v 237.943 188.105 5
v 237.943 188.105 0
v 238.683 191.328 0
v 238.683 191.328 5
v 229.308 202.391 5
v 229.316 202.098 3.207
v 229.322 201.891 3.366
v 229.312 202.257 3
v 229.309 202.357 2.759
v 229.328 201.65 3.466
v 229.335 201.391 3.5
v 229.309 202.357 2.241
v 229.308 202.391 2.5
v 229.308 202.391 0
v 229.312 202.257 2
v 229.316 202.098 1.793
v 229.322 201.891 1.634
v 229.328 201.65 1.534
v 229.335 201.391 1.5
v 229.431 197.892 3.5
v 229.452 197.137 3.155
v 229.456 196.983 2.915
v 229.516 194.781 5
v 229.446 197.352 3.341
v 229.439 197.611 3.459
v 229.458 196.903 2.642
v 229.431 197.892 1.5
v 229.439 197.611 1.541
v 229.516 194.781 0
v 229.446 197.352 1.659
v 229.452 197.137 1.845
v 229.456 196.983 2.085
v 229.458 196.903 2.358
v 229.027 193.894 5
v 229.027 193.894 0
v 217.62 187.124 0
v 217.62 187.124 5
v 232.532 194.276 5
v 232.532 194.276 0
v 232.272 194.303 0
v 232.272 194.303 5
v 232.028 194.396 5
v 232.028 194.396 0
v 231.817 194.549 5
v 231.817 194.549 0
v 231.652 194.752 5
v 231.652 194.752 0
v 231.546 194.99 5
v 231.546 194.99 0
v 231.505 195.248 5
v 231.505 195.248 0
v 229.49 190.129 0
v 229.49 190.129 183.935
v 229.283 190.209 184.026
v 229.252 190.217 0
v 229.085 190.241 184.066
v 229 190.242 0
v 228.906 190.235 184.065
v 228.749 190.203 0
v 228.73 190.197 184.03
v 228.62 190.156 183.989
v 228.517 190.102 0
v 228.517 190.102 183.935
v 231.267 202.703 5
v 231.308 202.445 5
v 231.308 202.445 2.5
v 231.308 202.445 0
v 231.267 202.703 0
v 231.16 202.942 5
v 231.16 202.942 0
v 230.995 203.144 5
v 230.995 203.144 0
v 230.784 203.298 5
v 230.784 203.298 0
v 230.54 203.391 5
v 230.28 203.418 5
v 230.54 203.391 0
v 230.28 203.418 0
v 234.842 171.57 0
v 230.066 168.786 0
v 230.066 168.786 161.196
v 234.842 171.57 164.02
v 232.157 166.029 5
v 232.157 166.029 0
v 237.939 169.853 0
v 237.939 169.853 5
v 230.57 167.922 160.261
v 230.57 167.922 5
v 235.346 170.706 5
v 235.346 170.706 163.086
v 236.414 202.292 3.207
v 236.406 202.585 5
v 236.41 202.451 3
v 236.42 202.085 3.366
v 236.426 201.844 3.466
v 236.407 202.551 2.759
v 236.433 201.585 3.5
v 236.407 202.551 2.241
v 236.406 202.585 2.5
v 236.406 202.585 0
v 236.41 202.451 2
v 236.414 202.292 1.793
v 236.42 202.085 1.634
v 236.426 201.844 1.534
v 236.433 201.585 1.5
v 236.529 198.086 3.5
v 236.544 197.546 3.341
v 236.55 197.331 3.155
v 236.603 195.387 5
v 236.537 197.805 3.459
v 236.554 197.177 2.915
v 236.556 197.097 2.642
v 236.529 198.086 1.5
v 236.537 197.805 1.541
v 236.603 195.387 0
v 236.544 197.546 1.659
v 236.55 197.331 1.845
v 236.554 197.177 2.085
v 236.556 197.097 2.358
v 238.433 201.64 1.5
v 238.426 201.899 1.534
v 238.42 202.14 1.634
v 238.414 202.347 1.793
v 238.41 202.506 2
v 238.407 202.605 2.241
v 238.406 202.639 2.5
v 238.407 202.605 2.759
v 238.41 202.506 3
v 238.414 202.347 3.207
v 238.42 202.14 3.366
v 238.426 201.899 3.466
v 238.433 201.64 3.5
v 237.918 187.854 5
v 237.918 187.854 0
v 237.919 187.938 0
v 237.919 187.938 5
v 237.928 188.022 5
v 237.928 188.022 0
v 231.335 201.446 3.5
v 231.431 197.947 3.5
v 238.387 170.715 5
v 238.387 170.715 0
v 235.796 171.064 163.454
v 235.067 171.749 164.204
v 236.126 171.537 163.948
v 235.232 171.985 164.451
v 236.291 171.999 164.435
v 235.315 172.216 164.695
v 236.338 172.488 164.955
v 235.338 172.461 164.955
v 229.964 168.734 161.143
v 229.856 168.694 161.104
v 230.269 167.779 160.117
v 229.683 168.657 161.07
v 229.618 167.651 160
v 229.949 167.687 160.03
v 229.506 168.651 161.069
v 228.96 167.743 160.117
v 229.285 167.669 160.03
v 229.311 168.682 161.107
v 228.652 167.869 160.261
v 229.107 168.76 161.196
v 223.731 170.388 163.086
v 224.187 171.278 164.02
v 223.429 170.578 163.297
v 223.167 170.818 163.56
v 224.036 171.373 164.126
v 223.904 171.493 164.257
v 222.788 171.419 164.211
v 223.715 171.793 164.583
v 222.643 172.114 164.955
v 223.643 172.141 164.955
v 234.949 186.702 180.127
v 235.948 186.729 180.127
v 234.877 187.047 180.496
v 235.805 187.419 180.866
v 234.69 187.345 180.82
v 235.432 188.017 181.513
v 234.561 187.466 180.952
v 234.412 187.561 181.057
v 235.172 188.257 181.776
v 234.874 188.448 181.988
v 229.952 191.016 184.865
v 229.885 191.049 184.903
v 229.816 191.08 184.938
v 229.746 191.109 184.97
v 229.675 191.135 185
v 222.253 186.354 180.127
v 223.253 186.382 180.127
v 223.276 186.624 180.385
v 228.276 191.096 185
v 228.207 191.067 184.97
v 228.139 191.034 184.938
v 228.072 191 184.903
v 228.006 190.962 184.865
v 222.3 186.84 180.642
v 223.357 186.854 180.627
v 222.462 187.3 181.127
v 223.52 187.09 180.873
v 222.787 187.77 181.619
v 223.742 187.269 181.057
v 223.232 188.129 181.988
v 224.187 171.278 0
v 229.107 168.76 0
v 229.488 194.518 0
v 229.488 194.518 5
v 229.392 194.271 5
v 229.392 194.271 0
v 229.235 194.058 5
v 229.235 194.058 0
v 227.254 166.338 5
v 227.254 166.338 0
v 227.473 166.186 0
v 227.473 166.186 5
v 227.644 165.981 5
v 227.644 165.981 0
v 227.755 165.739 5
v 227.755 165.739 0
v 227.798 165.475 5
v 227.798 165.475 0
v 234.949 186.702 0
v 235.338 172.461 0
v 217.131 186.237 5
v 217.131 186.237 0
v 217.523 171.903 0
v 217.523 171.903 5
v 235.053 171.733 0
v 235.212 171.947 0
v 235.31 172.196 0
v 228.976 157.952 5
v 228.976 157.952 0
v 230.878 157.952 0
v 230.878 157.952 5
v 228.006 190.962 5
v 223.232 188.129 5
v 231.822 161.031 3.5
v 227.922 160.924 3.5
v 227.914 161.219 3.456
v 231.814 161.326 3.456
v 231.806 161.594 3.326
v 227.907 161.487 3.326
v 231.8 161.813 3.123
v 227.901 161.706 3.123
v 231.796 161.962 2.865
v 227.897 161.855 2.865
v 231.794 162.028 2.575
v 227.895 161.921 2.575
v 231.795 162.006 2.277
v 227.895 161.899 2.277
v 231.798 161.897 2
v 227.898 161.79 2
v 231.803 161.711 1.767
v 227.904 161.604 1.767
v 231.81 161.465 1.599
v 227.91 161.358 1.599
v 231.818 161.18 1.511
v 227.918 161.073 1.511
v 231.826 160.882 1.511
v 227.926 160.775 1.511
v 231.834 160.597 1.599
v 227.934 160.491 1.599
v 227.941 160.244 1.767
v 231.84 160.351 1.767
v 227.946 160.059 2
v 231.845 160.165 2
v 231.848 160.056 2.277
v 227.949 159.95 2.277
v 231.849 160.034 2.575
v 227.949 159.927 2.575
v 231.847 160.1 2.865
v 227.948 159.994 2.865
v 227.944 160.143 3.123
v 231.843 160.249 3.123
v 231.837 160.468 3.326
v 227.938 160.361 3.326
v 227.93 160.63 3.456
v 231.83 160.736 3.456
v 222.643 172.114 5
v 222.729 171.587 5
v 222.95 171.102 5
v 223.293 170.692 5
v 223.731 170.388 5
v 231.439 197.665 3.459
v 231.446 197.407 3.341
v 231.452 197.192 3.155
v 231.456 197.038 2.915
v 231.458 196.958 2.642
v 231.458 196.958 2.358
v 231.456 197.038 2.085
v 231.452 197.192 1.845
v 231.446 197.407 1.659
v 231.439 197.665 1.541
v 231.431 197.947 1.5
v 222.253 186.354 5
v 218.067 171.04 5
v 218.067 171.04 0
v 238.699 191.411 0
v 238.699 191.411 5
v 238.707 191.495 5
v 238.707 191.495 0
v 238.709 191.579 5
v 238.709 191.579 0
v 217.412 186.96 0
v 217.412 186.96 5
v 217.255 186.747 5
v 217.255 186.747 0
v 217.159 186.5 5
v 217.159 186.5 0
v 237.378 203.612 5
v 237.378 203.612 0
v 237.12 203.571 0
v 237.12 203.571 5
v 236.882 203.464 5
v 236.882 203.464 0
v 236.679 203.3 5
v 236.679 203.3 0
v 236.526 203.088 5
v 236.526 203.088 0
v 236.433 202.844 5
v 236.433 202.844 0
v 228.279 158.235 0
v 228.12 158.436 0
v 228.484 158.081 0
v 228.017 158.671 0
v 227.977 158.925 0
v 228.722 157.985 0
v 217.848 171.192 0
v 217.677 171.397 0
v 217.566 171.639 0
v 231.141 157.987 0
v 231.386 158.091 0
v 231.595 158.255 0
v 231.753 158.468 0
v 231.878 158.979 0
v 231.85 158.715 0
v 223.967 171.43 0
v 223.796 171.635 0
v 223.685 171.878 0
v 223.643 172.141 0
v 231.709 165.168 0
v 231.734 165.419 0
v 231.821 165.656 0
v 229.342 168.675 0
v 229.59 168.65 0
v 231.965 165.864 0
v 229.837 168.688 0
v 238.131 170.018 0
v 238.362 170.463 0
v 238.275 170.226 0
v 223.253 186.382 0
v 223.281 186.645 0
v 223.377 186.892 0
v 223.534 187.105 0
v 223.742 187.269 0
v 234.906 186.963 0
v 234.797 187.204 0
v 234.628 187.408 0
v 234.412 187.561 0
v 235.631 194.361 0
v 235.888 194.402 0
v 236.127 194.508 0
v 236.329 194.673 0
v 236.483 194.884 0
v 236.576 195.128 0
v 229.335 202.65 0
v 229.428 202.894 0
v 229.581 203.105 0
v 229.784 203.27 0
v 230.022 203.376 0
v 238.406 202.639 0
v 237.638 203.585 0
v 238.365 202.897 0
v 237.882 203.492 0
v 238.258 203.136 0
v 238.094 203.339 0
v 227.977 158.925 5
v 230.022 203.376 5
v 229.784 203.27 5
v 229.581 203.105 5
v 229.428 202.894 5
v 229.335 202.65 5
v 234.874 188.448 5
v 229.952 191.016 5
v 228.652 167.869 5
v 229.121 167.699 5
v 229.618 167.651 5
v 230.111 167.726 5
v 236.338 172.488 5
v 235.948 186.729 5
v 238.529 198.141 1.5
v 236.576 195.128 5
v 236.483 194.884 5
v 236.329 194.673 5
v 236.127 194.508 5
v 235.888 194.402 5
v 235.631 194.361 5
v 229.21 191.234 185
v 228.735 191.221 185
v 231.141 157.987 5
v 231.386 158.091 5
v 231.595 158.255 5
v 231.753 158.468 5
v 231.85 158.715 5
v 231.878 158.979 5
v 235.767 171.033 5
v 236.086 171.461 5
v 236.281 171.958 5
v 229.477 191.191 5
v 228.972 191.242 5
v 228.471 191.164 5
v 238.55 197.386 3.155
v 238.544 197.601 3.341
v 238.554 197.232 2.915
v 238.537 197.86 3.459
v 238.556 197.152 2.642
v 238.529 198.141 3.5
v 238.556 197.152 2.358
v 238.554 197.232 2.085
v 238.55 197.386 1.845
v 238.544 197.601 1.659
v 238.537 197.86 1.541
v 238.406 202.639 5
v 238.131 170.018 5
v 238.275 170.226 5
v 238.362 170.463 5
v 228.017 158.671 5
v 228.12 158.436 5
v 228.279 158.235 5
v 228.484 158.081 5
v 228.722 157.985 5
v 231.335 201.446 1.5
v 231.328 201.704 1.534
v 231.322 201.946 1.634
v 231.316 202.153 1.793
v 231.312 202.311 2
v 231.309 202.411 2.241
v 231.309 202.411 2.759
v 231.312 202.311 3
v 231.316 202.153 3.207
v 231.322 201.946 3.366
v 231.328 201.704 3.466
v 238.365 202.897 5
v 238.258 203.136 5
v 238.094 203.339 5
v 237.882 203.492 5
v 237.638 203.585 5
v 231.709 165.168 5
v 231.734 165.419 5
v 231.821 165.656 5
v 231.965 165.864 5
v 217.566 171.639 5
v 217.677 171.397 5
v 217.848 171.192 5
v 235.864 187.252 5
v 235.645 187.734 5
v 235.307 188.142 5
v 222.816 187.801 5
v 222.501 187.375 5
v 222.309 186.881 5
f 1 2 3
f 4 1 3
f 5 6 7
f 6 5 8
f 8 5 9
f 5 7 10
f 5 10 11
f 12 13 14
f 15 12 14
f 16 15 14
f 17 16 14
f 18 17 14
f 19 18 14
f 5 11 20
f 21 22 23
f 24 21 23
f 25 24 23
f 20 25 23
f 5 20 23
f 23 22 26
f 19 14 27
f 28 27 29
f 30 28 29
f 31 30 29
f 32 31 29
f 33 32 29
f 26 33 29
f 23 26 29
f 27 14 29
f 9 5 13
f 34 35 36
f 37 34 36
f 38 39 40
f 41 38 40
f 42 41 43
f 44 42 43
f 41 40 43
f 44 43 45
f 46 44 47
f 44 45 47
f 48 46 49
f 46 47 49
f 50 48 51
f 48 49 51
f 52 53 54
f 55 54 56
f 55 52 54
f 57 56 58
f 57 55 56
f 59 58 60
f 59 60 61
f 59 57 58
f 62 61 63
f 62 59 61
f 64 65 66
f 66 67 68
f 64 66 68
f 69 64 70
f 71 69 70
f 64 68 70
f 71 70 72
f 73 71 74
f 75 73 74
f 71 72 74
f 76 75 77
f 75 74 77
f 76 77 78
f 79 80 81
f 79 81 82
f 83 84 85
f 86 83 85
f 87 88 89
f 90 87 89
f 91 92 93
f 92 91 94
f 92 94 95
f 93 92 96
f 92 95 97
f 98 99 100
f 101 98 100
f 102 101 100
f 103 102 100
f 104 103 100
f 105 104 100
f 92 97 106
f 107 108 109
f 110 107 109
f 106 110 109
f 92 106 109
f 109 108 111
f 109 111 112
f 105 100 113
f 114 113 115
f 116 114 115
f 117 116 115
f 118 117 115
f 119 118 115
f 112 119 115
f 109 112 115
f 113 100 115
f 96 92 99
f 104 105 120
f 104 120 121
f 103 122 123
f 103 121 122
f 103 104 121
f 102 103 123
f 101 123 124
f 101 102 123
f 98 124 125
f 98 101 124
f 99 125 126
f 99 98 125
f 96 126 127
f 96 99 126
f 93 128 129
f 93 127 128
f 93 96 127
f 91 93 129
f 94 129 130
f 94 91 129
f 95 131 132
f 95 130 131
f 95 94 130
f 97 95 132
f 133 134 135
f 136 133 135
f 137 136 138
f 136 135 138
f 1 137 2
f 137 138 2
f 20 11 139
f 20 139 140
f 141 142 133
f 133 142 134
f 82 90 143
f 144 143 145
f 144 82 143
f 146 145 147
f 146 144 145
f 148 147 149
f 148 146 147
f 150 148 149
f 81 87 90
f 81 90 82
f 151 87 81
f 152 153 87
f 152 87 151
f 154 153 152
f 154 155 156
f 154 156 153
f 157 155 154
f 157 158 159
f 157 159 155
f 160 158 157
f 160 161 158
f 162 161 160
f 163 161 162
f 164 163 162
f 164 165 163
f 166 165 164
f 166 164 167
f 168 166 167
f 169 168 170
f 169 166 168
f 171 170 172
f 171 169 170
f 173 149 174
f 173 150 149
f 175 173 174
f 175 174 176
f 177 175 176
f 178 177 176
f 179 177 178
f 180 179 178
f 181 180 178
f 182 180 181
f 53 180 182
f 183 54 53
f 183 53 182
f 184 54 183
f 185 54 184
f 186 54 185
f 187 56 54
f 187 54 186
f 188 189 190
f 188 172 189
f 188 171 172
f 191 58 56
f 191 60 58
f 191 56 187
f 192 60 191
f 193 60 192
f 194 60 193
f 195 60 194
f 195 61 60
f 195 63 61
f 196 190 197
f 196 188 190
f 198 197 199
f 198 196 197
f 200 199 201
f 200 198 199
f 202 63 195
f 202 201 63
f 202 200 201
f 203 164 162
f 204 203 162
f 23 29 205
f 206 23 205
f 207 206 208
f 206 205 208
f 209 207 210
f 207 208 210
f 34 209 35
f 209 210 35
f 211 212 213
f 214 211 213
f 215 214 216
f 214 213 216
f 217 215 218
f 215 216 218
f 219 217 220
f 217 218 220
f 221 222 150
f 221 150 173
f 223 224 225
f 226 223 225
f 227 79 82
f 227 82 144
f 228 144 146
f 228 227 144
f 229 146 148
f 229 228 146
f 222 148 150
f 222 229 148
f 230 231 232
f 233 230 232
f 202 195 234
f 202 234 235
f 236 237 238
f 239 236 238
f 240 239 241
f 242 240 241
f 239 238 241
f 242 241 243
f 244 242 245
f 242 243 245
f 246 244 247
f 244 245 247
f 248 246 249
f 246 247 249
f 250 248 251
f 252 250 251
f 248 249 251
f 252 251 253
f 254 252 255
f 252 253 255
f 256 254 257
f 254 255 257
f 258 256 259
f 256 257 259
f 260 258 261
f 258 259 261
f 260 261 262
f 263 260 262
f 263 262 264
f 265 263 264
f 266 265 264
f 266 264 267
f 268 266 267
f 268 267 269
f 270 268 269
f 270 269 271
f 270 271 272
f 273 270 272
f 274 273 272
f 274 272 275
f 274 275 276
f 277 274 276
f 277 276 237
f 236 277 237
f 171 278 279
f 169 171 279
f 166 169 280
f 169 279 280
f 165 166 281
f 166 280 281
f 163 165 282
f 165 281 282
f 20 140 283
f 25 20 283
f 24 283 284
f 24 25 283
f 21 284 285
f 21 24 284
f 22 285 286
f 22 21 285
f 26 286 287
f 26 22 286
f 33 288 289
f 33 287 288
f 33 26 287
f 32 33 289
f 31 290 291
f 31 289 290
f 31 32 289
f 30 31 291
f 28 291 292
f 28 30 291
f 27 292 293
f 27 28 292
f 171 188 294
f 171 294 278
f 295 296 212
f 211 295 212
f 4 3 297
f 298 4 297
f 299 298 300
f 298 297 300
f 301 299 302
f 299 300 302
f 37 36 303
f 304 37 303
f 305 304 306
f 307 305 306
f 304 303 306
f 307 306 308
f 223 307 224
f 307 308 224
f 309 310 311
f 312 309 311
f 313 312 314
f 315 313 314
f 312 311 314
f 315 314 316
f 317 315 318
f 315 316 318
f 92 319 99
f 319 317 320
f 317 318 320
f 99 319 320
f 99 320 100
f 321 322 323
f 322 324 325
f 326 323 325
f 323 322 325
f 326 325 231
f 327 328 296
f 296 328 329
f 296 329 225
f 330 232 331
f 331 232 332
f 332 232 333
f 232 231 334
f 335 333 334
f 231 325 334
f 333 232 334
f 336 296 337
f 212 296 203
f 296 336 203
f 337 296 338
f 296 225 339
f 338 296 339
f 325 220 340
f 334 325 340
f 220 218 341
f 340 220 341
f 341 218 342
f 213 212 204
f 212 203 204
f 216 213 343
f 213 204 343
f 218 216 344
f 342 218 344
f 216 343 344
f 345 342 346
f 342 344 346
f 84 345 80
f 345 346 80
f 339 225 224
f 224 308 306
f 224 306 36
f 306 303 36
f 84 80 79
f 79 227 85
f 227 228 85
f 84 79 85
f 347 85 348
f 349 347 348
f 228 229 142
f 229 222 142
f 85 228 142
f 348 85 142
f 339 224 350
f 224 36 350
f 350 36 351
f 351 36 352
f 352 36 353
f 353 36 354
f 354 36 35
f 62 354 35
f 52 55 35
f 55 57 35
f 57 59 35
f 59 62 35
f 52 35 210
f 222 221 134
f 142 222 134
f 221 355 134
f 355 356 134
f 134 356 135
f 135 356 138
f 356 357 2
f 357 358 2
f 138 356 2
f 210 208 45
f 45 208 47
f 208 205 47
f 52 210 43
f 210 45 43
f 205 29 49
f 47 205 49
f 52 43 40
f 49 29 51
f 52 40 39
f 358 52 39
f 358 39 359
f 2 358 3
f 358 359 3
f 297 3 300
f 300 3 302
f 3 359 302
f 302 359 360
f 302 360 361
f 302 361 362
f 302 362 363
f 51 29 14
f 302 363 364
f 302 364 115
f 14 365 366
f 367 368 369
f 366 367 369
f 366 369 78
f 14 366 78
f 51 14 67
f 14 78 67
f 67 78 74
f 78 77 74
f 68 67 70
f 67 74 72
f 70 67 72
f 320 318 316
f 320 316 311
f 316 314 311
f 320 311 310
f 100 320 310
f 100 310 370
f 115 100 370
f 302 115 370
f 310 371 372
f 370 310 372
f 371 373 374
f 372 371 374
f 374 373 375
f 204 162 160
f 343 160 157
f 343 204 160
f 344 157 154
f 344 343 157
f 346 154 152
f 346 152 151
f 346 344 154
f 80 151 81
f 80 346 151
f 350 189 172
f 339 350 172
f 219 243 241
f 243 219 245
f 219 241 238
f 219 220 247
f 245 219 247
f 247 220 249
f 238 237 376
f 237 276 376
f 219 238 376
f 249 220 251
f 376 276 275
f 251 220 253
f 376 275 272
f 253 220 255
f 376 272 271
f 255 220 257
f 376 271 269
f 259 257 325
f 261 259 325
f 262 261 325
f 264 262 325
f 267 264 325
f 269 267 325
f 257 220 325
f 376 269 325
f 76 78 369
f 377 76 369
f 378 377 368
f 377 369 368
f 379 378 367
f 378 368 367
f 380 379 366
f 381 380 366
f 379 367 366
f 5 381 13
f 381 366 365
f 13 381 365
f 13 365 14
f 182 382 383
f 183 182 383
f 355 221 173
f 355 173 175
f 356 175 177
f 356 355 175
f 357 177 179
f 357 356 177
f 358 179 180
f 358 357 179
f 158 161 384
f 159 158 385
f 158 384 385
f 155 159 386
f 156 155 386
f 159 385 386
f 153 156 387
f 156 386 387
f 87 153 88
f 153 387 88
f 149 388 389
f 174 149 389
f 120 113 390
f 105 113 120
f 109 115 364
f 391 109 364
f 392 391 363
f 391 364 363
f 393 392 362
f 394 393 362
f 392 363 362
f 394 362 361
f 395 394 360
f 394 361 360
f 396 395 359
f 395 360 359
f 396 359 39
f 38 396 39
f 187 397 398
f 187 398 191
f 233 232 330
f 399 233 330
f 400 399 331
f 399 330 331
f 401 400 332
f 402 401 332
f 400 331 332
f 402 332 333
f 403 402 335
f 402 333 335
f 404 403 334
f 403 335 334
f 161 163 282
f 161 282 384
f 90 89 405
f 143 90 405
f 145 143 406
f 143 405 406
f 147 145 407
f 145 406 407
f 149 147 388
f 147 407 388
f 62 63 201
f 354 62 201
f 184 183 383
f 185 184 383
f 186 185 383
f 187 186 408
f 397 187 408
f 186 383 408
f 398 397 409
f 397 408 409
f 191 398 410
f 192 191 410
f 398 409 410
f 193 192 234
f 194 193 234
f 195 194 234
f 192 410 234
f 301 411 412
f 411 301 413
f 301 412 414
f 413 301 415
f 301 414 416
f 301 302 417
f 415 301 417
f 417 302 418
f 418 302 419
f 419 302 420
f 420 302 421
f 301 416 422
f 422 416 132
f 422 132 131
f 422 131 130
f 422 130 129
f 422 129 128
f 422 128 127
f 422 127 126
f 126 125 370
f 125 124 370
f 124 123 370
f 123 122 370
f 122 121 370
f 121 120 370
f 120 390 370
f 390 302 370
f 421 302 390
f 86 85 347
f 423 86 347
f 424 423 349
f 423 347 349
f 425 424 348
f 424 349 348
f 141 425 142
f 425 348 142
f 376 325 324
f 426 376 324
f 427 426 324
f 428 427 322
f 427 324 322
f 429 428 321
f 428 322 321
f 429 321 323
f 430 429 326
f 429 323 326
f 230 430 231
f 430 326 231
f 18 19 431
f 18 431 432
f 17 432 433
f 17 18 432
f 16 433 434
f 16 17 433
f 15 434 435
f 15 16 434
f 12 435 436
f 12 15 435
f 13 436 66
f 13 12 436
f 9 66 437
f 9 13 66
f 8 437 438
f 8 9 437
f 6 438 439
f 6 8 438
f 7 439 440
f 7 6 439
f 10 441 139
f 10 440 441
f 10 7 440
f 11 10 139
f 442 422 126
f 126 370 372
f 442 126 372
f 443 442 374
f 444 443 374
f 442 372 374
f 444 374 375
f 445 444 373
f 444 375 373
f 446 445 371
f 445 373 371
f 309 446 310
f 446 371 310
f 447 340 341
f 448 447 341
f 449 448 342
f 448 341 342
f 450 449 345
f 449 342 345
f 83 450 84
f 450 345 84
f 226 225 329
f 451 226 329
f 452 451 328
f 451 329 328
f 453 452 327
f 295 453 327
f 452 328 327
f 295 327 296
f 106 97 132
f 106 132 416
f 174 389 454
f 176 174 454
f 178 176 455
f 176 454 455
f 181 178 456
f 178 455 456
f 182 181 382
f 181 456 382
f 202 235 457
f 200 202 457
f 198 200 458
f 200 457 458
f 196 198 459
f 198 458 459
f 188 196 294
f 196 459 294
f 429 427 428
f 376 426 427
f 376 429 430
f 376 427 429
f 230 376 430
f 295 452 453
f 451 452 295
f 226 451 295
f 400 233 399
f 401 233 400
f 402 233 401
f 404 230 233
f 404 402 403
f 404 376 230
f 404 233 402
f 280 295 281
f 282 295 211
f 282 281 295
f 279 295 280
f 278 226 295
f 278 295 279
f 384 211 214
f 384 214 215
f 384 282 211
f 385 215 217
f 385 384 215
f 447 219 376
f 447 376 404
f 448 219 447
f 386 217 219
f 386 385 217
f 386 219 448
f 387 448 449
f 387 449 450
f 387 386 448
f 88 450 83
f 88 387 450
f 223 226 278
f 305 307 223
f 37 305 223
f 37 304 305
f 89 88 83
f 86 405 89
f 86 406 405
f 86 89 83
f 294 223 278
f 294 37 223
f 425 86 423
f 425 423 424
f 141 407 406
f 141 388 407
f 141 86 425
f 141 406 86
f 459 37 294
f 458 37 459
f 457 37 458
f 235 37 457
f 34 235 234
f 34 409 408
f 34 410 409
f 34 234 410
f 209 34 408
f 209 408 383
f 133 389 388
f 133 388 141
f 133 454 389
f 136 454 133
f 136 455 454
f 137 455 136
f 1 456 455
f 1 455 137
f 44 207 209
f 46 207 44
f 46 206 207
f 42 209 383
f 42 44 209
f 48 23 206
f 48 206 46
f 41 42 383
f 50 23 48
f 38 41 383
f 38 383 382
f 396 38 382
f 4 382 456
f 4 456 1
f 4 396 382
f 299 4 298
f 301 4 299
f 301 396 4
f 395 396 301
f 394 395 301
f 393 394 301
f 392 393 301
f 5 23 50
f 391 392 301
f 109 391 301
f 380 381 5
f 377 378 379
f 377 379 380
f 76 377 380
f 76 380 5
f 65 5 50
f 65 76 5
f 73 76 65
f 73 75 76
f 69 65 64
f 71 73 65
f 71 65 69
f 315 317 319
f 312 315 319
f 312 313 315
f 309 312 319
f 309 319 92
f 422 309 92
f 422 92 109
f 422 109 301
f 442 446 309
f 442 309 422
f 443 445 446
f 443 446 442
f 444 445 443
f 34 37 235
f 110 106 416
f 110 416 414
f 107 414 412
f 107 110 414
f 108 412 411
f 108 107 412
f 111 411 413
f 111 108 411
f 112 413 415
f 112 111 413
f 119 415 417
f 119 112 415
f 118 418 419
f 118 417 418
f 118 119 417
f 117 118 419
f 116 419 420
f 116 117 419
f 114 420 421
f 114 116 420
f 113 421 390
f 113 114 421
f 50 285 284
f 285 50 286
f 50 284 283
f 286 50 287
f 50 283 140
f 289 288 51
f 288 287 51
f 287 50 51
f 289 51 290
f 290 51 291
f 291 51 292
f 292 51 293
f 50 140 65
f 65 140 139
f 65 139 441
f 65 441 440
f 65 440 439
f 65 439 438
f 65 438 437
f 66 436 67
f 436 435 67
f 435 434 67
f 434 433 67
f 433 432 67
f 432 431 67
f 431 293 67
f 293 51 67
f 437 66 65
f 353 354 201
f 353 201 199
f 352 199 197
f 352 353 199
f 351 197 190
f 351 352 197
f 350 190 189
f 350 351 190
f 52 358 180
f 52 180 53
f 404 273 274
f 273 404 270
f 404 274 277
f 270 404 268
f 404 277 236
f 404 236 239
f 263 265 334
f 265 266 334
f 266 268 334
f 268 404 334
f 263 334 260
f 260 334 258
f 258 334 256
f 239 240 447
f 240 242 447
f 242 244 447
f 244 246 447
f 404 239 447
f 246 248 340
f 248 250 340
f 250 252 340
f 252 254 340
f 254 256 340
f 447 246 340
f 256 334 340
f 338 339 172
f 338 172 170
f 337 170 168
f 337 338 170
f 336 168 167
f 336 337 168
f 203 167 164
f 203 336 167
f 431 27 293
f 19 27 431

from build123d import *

# Parameters (mm, degrees)
BOSS_EXTRUDE1_DEPTH = 5
BOSS_EXTRUDE2_DEPTH = 180
SKETCH3_R           = 1
CUT_EXTRUDE1_DEPTH  = 180


with BuildPart() as part:
    # Sketch1 → Boss-Extrude1 (new body)
    with BuildSketch(Plane.XY):
        with BuildLine():
            Line((217.13080024, 186.236980413), (217.522895205, 171.902828405))
            ThreePointArc((217.522895205, 171.902828405), (217.676624689, 171.396825166), (218.066927795, 171.039984141))
            Line((218.066927795, 171.039984141), (227.253610039, 166.338288505))
            ThreePointArc((227.253610039, 166.338288505), (227.643913146, 165.981447481), (227.79764263, 165.475444242))
            Line((227.79764263, 165.475444242), (227.976831168, 158.924695096))
            ThreePointArc((227.976831168, 158.924695096), (228.279084932, 158.235329737), (228.97645726, 157.952038769))
            Line((228.97645726, 157.952038769), (230.8781853, 157.952038769))
            ThreePointArc((230.8781853, 157.952038769), (231.594894332, 158.254666441), (231.877811392, 158.979382441))
            Line((231.877811392, 158.979382441), (231.708538067, 165.167652598))
            ThreePointArc((231.708538067, 165.167652598), (231.820970232, 165.656392994), (232.156538916, 166.029088346))
            Line((232.156538916, 166.029088346), (237.939045309, 169.853338197))
            ThreePointArc((237.939045309, 169.853338197), (238.274613993, 170.226033549), (238.387046158, 170.714773945))
            Line((238.387046158, 170.714773945), (237.918224361, 187.853894574))
            ThreePointArc((237.918224361, 187.853894574), (237.922769134, 187.980299684), (237.94323412, 188.105119919))
            Line((237.94323412, 188.105119919), (238.683490474, 191.327652279))
            ThreePointArc((238.683490474, 191.327652279), (238.70395546, 191.452472514), (238.708500233, 191.578877624))
            Line((238.708500233, 191.578877624), (238.40594927, 202.639492732))
            ThreePointArc((238.40594927, 202.639492732), (238.093830671, 203.338326344), (237.37823169, 203.611754696))
            ThreePointArc((237.37823169, 203.611754696), (236.679398078, 203.299636096), (236.40594927, 202.584784932))
            Line((236.40594927, 202.584784932), (236.602823712, 195.38747707))
            ThreePointArc((236.602823712, 195.38747707), (236.329374904, 194.672625906), (235.630541293, 194.360507306))
            Line((235.630541293, 194.360507306), (232.531700408, 194.275741921))
            ThreePointArc((232.531700408, 194.275741921), (231.816849243, 194.549190729), (231.504730643, 195.248024341))
            Line((231.504730643, 195.248024341), (231.307856202, 202.445332202))
            ThreePointArc((231.307856202, 202.445332202), (230.995737602, 203.144165814), (230.280138621, 203.417594166))
            ThreePointArc((230.280138621, 203.417594166), (229.581305009, 203.105475566), (229.307856202, 202.390624402))
            Line((229.307856202, 202.390624402), (229.516006509, 194.781095054))
            ThreePointArc((229.516006509, 194.781095054), (229.392075465, 194.270886823), (229.026740392, 193.893790513))
            Line((229.026740392, 193.893790513), (217.620066357, 187.124284954))
            ThreePointArc((217.620066357, 187.124284954), (217.254731284, 186.747188644), (217.13080024, 186.236980413))
        make_face()
        with BuildLine():
            Line((228.516569513, 190.102489168), (223.742260028, 187.269085277))
            ThreePointArc((223.742260028, 187.269085277), (223.376924955, 186.891988967), (223.252993911, 186.381780736))
            Line((223.252993911, 186.381780736), (223.642537472, 172.14090257))
            ThreePointArc((223.642537472, 172.14090257), (223.796266956, 171.634899331), (224.186570063, 171.278058307))
            Line((224.186570063, 171.278058307), (229.107271966, 168.759668963))
            ThreePointArc((229.107271966, 168.759668963), (229.59020914, 168.650230807), (230.066441509, 168.785905991))
            Line((230.066441509, 168.785905991), (234.842112696, 171.569528957))
            ThreePointArc((234.842112696, 171.569528957), (235.212324771, 171.947173038), (235.338162748, 172.460823537))
            Line((235.338162748, 172.460823537), (234.948619186, 186.701701703))
            ThreePointArc((234.948619186, 186.701701703), (234.796981963, 187.204372068), (234.41157851, 187.560932751))
            Line((234.41157851, 187.560932751), (229.489514903, 190.12910302))
            ThreePointArc((229.489514903, 190.12910302), (228.999585816, 190.242154392), (228.516569513, 190.102489168))
        make_face(mode=Mode.SUBTRACT)
    extrude(amount=BOSS_EXTRUDE1_DEPTH)

    # Sketch2 → Boss-Extrude2 (add)
    with BuildSketch(Plane.XY.offset(5)):
        with BuildLine():
            Line((228.006209537, 190.962450037), (223.231900052, 188.129046145))
            ThreePointArc((223.231900052, 188.129046145), (222.501229906, 187.374853526), (222.253367819, 186.354437063))
            Line((222.253367819, 186.354437063), (222.642911381, 172.113558898))
            ThreePointArc((222.642911381, 172.113558898), (222.950370347, 171.10155242), (223.730976561, 170.387870371))
            Line((223.730976561, 170.387870371), (228.651678464, 167.869481027))
            ThreePointArc((228.651678464, 167.869481027), (229.617552813, 167.650604715), (230.57001755, 167.921955083))
            Line((230.57001755, 167.921955083), (235.345688737, 170.705578049))
            ThreePointArc((235.345688737, 170.705578049), (236.086112886, 171.460866211), (236.337788839, 172.48816721))
            Line((236.337788839, 172.48816721), (235.948245278, 186.729045376))
            ThreePointArc((235.948245278, 186.729045376), (235.644970831, 187.734386104), (234.874163925, 188.44750747))
            Line((234.874163925, 188.44750747), (229.952100319, 191.015677739))
            ThreePointArc((229.952100319, 191.015677739), (228.972242143, 191.241780484), (228.006209537, 190.962450037))
        make_face()
        with BuildLine():
            Line((223.252993911, 186.381780736), (223.642537472, 172.14090257))
            ThreePointArc((223.642537472, 172.14090257), (223.796266956, 171.634899331), (224.186570063, 171.278058307))
            Line((224.186570063, 171.278058307), (229.107271966, 168.759668963))
            ThreePointArc((229.107271966, 168.759668963), (229.59020914, 168.650230807), (230.066441509, 168.785905991))
            Line((230.066441509, 168.785905991), (234.842112696, 171.569528957))
            ThreePointArc((234.842112696, 171.569528957), (235.212324771, 171.947173038), (235.338162748, 172.460823537))
            Line((235.338162748, 172.460823537), (234.948619186, 186.701701703))
            ThreePointArc((234.948619186, 186.701701703), (234.796981963, 187.204372068), (234.41157851, 187.560932751))
            Line((234.41157851, 187.560932751), (229.489514903, 190.12910302))
            ThreePointArc((229.489514903, 190.12910302), (228.999585816, 190.242154392), (228.516569513, 190.102489168))
            Line((228.516569513, 190.102489168), (223.742260028, 187.269085277))
            ThreePointArc((223.742260028, 187.269085277), (223.376924955, 186.891988967), (223.252993911, 186.381780736))
        make_face(mode=Mode.SUBTRACT)
    extrude(amount=BOSS_EXTRUDE2_DEPTH)

    # Sketch3 → Cut-Extrude1 (cut)
    with BuildSketch(Plane(origin=(227.180903608, 6.214283783, 0), x_dir=(0, 0, 1), z_dir=(-0.999626092, -0.027343672, 0))):
        with Locations((2.5, 154.631921977)):
            Circle(SKETCH3_R)
        Polygon((185, 184.782926083), (185, 161.309331644), (160, 161.309331644), align=None)
        with BuildLine():
            Line((3.5, 195.044829999), (3.5, 191.544829999))
            ThreePointArc((3.5, 191.544829999), (2.5, 190.544829999), (1.5, 191.544829999))
            Line((1.5, 191.544829999), (1.5, 195.044829999))
            ThreePointArc((1.5, 195.044829999), (2.5, 196.044829999), (3.5, 195.044829999))
        make_face()
    extrude(amount=-CUT_EXTRUDE1_DEPTH, mode=Mode.SUBTRACT)


solid = part.part
